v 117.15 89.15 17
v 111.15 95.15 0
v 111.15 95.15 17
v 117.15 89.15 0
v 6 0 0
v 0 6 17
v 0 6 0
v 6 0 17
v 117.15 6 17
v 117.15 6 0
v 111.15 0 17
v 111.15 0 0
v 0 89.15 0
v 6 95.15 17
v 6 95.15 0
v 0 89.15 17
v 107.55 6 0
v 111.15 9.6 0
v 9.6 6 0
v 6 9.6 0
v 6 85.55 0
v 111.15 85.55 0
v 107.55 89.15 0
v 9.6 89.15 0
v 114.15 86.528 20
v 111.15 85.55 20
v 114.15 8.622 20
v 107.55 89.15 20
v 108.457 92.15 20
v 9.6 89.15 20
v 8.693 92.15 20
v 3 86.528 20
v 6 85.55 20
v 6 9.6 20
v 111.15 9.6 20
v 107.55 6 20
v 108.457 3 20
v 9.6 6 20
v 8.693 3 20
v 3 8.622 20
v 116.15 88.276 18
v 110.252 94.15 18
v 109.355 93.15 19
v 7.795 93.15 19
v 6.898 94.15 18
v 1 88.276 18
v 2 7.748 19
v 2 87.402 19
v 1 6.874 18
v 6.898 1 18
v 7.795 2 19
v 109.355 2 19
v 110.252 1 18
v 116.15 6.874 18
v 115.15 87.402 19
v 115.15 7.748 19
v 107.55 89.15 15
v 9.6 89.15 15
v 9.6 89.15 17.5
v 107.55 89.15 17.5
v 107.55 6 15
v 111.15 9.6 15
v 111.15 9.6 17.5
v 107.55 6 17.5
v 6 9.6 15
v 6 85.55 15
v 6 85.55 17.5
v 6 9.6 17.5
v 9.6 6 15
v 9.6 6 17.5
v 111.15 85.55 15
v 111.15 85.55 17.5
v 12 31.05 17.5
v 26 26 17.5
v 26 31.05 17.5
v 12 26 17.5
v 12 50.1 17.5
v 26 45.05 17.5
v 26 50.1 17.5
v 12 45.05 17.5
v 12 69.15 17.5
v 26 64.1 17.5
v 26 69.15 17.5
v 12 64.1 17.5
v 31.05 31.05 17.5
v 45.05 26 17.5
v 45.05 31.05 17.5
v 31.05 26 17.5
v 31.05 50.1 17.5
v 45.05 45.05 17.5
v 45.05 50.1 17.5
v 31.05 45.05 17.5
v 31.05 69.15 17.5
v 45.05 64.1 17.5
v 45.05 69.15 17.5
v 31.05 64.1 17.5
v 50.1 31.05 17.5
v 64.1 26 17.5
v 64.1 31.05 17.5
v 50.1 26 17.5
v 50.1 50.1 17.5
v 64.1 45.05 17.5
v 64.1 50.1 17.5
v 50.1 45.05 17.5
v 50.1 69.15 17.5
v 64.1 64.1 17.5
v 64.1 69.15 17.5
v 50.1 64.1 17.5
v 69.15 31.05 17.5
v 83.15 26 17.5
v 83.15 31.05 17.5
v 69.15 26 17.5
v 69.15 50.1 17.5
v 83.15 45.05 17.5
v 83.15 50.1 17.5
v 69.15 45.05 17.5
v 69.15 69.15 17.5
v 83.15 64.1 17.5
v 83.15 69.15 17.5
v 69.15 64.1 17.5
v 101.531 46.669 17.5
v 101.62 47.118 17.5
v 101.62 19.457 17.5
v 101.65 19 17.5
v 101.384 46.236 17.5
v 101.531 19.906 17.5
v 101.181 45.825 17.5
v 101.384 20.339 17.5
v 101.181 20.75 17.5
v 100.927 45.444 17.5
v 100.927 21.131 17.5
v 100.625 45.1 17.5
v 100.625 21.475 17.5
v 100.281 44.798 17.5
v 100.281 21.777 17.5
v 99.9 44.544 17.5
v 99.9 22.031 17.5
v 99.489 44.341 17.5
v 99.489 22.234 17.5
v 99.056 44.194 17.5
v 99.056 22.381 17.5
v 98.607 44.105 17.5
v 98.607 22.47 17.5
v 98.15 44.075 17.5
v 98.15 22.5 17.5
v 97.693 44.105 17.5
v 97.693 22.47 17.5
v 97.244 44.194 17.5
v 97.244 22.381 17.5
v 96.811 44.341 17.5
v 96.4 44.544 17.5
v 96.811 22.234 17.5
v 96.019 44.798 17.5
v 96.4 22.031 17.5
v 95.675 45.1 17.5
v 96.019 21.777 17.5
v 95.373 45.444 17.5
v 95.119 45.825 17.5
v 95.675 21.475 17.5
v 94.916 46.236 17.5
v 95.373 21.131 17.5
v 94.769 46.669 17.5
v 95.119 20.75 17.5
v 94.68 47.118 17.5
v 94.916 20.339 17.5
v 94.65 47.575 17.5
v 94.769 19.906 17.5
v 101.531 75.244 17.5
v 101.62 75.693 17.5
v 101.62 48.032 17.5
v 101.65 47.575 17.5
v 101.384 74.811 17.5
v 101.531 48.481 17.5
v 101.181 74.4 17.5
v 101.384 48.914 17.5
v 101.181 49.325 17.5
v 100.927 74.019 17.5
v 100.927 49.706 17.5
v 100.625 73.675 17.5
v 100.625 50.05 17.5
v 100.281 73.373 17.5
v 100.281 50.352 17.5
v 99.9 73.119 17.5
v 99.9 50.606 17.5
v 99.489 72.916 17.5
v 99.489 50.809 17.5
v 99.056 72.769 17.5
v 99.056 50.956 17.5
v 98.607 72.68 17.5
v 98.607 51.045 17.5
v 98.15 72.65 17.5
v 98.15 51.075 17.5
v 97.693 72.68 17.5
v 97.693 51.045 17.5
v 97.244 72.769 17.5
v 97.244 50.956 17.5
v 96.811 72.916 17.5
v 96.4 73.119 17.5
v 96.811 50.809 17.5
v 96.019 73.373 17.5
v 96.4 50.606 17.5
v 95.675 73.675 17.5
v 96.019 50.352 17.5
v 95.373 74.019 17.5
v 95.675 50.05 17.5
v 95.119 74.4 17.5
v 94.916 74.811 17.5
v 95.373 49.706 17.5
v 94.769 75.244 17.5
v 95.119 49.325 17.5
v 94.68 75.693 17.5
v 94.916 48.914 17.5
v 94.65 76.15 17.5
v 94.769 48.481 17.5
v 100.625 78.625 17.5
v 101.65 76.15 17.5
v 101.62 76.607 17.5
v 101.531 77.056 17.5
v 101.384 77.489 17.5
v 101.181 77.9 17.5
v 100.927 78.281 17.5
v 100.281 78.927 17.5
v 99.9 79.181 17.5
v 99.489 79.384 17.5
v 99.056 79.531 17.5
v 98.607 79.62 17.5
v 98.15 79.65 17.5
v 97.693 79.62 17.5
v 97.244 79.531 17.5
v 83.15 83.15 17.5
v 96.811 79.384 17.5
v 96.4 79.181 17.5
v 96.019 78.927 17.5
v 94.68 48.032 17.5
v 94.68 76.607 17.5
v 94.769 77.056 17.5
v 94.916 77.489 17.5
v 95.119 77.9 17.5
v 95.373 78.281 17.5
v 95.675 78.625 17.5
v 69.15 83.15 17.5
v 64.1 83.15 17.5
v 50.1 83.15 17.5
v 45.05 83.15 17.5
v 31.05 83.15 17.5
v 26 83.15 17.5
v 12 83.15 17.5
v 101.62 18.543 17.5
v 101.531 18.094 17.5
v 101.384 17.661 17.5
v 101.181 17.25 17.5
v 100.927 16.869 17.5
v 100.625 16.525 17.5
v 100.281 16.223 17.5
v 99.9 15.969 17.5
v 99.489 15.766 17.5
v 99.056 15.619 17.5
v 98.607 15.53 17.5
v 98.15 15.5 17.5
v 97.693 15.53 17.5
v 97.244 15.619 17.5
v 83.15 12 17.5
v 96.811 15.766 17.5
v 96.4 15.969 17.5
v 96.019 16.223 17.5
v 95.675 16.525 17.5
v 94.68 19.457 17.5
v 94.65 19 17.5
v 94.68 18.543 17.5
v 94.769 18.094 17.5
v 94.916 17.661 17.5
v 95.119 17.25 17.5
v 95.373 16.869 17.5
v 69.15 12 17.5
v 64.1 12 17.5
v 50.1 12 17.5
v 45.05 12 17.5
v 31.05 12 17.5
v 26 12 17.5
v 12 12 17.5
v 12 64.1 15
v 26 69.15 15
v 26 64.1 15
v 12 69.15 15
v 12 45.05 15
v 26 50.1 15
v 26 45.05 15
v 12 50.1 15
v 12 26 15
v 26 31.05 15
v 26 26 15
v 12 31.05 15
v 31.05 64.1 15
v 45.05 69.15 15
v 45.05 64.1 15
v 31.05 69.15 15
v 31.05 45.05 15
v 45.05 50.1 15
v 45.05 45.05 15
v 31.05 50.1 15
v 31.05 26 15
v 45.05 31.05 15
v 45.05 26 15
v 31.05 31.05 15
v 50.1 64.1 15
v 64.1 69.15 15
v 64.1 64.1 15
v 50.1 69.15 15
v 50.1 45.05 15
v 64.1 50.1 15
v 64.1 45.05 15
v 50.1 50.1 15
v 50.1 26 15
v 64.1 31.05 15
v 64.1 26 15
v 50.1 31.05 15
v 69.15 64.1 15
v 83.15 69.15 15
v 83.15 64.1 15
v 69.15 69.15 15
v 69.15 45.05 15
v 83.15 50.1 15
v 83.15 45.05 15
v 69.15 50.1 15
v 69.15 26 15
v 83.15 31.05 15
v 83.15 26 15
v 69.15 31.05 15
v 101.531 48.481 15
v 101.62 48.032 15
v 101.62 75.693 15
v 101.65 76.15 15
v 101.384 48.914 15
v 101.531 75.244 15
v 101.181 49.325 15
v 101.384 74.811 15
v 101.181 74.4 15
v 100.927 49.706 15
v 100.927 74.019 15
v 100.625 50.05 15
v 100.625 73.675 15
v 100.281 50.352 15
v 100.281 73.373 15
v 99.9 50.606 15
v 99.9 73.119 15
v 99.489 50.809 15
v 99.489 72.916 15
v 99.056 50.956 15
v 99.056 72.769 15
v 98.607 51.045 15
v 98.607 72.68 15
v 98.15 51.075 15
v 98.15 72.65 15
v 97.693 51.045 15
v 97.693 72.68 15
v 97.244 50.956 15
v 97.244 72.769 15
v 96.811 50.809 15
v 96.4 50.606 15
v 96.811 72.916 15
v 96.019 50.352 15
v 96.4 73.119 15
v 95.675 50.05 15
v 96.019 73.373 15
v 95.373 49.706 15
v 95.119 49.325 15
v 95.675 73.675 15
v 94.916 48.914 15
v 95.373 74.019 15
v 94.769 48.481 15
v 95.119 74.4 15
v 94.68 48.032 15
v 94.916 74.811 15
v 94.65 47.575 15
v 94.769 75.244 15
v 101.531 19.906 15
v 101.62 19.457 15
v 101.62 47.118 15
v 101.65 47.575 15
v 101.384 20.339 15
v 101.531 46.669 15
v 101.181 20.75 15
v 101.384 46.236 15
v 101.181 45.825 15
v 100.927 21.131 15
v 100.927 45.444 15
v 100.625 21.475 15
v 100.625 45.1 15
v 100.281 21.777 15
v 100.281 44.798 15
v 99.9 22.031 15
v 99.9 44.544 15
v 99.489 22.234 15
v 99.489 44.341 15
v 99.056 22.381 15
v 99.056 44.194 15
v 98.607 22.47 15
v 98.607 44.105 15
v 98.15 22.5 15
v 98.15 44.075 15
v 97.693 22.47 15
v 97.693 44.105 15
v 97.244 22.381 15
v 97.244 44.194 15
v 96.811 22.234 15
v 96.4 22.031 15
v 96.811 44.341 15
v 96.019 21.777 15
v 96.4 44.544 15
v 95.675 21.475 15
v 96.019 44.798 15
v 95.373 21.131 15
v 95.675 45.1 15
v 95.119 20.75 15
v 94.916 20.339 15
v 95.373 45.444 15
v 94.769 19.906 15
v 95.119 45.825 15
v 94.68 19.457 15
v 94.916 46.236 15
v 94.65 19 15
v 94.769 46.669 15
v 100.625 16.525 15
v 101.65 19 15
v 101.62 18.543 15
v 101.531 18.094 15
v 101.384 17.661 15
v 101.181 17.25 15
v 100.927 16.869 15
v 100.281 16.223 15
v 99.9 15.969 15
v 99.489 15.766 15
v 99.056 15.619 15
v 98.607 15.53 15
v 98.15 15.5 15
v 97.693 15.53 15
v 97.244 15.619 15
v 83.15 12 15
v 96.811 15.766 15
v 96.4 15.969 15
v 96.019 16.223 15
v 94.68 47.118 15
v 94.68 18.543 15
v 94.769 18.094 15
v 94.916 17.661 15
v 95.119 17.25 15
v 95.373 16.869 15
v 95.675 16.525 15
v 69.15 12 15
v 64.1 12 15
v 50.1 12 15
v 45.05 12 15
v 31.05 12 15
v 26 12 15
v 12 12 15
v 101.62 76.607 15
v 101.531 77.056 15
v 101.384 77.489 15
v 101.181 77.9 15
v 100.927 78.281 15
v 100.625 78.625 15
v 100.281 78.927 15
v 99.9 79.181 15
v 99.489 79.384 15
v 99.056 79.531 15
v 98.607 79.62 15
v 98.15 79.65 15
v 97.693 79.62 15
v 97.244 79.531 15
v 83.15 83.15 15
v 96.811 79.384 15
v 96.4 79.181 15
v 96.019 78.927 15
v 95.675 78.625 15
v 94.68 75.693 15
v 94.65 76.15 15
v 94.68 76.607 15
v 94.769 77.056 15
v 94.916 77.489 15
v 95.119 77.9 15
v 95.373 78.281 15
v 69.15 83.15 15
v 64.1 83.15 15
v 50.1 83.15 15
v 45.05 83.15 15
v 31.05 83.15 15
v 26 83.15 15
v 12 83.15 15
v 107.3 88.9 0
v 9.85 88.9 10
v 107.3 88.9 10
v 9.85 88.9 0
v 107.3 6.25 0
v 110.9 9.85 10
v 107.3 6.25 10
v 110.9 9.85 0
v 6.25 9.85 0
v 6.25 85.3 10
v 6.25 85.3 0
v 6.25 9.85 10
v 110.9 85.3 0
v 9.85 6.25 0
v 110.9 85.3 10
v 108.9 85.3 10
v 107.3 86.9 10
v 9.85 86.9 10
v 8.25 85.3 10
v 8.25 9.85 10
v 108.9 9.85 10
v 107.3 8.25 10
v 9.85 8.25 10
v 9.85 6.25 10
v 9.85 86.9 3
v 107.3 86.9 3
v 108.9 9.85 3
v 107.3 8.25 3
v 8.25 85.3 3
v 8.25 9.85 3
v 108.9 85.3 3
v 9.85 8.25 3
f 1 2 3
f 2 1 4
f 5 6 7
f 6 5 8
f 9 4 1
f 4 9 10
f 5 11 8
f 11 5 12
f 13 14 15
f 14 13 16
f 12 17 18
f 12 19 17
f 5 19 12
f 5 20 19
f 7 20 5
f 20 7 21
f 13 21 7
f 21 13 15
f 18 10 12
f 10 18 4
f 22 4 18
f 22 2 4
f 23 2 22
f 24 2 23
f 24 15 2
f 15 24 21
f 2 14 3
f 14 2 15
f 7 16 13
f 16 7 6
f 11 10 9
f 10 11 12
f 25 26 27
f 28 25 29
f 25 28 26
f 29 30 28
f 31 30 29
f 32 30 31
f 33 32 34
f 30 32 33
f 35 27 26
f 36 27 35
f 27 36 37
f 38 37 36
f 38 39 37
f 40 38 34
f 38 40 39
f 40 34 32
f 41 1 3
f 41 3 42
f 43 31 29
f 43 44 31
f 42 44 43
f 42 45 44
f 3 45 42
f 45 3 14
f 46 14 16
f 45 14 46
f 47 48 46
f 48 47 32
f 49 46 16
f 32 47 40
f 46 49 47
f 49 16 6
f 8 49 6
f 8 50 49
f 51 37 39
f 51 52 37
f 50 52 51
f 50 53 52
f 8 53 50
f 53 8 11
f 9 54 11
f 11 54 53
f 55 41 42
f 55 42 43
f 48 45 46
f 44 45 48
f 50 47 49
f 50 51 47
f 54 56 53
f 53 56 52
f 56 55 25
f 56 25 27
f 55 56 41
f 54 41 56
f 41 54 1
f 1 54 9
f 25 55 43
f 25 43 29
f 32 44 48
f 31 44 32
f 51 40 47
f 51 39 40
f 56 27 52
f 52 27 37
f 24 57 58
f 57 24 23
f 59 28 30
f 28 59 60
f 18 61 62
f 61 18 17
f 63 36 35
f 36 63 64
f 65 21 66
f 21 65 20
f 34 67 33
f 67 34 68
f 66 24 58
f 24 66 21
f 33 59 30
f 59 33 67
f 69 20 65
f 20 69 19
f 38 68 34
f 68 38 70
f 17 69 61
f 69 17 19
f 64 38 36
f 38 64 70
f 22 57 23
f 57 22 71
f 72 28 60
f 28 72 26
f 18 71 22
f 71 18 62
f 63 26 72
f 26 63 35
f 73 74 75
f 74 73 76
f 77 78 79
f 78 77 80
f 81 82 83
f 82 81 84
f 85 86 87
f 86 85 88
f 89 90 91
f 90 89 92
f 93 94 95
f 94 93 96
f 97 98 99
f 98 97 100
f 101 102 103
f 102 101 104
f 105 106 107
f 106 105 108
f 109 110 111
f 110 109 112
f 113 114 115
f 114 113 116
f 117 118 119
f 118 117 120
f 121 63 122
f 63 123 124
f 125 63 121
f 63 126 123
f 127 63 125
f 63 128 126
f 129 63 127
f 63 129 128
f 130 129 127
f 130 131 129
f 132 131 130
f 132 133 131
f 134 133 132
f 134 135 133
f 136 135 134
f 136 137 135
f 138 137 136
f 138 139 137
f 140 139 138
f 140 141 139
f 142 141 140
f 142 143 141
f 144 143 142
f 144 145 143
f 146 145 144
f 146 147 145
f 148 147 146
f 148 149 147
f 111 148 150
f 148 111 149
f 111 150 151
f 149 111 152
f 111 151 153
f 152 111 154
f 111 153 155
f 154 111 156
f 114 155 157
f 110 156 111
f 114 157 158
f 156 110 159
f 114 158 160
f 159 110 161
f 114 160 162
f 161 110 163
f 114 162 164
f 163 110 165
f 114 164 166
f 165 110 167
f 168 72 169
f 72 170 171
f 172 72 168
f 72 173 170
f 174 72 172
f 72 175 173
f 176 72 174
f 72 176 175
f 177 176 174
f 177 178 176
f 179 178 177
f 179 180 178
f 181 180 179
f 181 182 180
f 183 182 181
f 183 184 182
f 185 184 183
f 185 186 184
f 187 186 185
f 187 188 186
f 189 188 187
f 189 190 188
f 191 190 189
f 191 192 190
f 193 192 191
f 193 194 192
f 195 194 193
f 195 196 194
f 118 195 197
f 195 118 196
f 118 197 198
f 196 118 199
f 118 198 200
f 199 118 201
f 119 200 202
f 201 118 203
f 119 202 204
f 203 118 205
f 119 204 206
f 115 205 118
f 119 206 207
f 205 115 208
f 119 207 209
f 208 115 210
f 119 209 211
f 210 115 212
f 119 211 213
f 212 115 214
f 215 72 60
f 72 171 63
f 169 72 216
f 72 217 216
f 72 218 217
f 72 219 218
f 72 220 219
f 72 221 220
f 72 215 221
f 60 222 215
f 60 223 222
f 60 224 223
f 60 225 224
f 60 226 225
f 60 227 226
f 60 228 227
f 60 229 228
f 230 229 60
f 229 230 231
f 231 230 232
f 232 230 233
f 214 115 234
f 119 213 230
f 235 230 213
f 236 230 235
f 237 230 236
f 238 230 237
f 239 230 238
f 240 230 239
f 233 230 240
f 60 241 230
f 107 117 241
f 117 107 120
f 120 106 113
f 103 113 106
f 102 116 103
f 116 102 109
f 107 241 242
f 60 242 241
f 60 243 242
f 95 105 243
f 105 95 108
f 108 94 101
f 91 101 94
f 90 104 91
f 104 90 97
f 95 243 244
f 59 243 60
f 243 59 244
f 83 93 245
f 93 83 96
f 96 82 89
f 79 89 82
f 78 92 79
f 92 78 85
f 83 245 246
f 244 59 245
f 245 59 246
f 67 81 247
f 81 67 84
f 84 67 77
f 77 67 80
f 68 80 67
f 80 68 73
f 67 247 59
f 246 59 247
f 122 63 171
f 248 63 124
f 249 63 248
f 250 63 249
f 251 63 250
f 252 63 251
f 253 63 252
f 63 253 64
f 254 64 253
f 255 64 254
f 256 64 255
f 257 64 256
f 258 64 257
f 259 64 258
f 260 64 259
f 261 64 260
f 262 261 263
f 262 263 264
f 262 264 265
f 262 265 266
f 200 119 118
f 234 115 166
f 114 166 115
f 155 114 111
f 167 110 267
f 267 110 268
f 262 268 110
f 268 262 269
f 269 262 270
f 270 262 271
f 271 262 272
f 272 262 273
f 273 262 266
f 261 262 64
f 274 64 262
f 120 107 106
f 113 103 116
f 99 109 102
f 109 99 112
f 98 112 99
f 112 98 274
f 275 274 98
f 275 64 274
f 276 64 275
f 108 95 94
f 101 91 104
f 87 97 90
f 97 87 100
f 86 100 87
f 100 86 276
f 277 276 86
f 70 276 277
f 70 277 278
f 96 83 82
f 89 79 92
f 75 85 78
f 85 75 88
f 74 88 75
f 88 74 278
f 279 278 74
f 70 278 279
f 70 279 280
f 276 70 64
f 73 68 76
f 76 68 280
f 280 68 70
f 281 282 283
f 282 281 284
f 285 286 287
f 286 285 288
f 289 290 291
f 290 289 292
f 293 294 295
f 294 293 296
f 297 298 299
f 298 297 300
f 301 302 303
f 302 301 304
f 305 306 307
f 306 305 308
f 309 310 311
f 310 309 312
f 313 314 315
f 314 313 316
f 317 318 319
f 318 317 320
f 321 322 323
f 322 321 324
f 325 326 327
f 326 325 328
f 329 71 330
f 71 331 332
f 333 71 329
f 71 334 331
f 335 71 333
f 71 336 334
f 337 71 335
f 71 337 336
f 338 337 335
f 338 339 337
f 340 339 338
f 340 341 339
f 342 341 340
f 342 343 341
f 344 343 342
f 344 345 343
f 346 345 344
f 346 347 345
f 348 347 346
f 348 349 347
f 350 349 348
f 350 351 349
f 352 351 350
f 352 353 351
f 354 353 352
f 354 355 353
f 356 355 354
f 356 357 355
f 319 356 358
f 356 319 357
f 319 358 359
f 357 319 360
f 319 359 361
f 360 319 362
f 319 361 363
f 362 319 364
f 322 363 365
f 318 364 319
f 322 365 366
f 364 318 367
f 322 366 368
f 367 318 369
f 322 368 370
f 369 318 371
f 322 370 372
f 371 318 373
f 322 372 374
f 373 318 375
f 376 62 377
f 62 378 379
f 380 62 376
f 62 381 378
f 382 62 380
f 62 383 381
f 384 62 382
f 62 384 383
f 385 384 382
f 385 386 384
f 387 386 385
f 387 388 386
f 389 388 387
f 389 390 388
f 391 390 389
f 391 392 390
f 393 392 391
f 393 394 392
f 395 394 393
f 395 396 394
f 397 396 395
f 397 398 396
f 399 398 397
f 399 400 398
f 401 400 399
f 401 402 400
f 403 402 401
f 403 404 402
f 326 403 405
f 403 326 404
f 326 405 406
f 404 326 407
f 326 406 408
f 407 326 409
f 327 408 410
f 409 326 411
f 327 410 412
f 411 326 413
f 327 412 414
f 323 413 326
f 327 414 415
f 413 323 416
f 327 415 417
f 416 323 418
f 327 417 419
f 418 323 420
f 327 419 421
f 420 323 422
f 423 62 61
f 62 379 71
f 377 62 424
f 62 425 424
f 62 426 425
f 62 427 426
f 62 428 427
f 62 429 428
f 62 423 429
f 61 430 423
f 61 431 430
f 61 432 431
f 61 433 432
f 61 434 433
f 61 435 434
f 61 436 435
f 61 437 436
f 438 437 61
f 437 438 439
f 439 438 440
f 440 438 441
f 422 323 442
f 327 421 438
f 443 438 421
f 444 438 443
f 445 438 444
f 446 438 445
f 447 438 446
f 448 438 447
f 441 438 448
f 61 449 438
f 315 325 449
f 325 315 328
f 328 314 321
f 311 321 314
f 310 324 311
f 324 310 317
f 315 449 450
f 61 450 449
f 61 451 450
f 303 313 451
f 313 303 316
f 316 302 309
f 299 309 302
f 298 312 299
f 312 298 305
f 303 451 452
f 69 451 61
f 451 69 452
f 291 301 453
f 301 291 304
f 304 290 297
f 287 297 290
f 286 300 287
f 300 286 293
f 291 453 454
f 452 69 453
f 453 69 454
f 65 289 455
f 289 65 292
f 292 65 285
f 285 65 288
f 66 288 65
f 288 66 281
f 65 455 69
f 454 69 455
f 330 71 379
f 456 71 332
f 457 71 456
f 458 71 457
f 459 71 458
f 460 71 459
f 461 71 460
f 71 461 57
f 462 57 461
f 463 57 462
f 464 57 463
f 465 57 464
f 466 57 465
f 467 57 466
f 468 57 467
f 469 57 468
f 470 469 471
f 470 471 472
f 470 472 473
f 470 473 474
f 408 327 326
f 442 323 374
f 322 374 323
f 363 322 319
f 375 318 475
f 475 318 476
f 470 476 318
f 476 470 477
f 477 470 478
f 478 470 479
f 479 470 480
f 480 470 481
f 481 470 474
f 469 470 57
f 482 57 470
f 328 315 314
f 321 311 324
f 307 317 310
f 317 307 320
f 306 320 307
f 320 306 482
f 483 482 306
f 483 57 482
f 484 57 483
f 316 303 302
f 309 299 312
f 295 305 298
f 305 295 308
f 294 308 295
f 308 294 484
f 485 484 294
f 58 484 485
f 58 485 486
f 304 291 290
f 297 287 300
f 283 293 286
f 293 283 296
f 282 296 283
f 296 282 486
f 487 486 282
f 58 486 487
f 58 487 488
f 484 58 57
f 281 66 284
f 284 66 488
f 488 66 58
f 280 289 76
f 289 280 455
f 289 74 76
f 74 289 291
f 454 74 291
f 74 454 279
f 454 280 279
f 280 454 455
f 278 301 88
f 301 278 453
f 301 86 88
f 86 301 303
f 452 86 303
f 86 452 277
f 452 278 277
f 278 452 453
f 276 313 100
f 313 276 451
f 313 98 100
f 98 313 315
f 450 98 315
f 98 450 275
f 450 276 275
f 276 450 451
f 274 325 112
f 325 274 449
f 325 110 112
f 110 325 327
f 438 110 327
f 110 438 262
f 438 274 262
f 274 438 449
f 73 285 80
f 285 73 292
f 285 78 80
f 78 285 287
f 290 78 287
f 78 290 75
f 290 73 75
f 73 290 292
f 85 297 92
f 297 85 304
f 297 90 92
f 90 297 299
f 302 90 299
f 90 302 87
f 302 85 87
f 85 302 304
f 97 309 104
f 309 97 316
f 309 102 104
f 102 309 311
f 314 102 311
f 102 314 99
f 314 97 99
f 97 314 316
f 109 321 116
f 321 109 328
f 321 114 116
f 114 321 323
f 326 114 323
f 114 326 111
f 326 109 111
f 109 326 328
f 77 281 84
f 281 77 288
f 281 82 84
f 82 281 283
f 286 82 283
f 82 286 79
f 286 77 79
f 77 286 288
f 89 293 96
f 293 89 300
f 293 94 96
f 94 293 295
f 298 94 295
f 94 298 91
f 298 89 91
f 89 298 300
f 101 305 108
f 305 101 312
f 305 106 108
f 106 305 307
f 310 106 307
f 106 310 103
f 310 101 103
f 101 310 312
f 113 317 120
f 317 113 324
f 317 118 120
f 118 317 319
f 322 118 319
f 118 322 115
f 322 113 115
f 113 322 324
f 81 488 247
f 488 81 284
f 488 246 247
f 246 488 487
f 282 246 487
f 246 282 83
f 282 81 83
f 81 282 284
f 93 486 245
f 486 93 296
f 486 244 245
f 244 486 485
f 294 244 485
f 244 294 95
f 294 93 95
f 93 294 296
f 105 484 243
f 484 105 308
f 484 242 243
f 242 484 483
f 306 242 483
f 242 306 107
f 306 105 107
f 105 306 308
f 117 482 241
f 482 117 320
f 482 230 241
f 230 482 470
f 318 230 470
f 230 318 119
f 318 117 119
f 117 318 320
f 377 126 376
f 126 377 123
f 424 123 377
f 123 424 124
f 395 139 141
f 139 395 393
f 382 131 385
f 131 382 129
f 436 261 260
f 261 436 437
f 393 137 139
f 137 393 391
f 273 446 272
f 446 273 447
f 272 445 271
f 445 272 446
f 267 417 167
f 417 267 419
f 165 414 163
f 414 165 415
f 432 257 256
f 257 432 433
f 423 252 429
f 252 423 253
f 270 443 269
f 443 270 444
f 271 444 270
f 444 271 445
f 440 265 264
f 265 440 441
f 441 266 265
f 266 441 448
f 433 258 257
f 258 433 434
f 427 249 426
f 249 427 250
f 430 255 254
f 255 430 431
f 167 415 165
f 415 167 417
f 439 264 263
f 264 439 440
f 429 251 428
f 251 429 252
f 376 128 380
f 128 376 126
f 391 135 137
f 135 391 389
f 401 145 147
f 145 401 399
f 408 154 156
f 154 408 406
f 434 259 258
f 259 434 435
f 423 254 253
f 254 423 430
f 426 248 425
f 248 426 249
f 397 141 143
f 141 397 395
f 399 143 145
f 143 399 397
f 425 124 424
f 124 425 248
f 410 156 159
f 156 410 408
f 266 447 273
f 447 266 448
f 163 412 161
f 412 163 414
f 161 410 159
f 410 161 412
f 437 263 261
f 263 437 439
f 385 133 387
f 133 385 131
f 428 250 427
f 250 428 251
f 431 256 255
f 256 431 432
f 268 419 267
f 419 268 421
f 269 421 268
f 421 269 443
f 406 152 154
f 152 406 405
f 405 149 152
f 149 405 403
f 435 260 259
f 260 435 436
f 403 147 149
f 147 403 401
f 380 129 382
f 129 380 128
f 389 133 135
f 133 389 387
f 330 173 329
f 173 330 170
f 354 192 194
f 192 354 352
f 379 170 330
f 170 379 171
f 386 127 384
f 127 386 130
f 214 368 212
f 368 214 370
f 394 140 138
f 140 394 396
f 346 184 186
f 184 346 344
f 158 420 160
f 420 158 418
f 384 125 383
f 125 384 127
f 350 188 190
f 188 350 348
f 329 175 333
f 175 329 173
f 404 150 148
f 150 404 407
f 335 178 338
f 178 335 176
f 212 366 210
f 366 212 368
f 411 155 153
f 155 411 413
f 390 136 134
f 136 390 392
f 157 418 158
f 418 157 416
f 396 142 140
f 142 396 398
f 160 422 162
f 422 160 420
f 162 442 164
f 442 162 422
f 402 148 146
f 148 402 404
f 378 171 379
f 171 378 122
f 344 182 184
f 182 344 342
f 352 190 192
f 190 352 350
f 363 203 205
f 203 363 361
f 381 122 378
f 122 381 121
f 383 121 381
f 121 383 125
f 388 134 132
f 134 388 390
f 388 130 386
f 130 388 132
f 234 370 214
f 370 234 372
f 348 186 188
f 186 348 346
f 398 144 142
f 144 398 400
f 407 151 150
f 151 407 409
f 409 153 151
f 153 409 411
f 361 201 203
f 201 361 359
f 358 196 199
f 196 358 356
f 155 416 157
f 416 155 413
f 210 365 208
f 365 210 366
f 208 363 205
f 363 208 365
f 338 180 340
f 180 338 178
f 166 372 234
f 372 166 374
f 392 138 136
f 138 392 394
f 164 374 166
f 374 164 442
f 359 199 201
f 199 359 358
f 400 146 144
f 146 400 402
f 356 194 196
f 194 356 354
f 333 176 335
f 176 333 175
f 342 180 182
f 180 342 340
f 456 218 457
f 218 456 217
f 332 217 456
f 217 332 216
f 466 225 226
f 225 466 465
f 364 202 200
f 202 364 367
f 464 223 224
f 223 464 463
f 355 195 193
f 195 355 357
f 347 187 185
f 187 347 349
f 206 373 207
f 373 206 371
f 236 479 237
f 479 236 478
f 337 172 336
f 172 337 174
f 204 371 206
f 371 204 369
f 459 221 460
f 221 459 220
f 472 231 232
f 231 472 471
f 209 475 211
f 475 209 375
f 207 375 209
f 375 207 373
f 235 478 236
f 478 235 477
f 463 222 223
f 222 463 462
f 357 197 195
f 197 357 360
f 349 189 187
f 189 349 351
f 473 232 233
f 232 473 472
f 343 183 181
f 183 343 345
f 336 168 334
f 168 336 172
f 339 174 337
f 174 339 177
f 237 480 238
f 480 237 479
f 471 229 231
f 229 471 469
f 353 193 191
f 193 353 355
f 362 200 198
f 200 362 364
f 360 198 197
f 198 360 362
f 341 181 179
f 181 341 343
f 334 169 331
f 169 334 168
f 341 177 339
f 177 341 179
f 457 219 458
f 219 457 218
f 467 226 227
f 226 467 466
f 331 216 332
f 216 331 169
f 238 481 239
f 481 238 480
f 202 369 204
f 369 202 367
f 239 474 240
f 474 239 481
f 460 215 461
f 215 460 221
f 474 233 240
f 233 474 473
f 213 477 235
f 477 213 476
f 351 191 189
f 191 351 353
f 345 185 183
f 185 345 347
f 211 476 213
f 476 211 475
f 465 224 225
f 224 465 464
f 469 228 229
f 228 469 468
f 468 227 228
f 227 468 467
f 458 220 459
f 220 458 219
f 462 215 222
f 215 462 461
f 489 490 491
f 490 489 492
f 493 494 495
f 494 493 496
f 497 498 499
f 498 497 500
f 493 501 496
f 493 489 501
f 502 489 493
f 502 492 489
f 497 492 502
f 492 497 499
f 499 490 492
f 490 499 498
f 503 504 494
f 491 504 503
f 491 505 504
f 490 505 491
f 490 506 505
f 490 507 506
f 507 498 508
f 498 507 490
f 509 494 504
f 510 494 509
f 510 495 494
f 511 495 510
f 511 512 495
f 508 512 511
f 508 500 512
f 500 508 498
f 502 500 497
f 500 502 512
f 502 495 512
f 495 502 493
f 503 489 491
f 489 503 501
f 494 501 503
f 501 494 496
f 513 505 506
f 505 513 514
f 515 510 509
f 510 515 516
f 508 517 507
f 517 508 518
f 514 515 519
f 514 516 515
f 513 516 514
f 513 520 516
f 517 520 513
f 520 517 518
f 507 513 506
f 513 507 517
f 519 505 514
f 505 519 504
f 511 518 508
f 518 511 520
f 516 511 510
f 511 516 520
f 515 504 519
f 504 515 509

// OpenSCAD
// file: case_v4_bottom.scad
// Stream Deck Macro — bottom plate v4 (tray with sliding wall)
// Slides up into the top piece's inner cavity from below. The tray's outer
// wall matches the top's inner hollow, minus a small per-side clearance so
// it can actually slide in once printed.

include <case_params.scad>

fit_clearance    = 0.25; // per-side gap for a sliding fit
floor_thickness  = 3;    // tray floor thickness
wall_thickness   = 2;    // tray's own perimeter wall thickness
wall_height      = 10;   // how tall the tray wall is (slides into the top's cavity)

bottom_w = (plate_w - 2*border) - 2*fit_clearance;
bottom_d = (plate_d - 2*border) - 2*fit_clearance;
bottom_chamfer = corner_chamfer * 0.6;

module case_bottom() {
    translate([border + fit_clearance, border + fit_clearance, 0])
        difference() {
            linear_extrude(height = wall_height)
                chamfered_rect(bottom_w, bottom_d, bottom_chamfer);
            translate([wall_thickness, wall_thickness, floor_thickness])
                linear_extrude(height = wall_height)
                    chamfered_rect(bottom_w - 2*wall_thickness,
                                   bottom_d - 2*wall_thickness,
                                   max(bottom_chamfer - wall_thickness, 0.1));
        }
}

case_bottom();
// file: case_v4_top.scad
// Stream Deck Macro — top plate v4
// Outer shell style inspired by "MisteRdeck / Ocreeb DIY Macro Keypad"
// (printables.com) — fresh parametric geometry: chamfered-corner rim with a
// tapered top edge, and a recessed inner deck (like the original) for the
// switches, hollow underneath for switch body clearance.

include <case_params.scad>

module rim_shell() {
    // straight body
    linear_extrude(height = rim_height - bevel_height)
        chamfered_rect(plate_w, plate_d, corner_chamfer);
    // tapered top collar — centered before scaling so all 4 sides bevel evenly
    translate([plate_w/2, plate_d/2, rim_height - bevel_height])
        linear_extrude(height = bevel_height,
                       scale = [(plate_w - 2*bevel_inset) / plate_w,
                                (plate_d - 2*bevel_inset) / plate_d])
            translate([-plate_w/2, -plate_d/2])
                chamfered_rect(plate_w, plate_d, corner_chamfer);
}

module inner_hollow() {
    // full-depth opening inside the rim border, plus extra above/below to
    // guarantee clean cuts
    translate([border, border, -1])
        linear_extrude(height = rim_height + 2)
            chamfered_rect(plate_w - 2*border, plate_d - 2*border, corner_chamfer * 0.6);
}

module switch_deck() {
    // Slightly larger than the hollow it sits in, overlapping the wall by
    // `overlap` on every side — a flush, knife-edge touch is numerically
    // fragile for CSG union (esp. once one side gets a multmatrix applied
    // to it) and can leave the deck as a disconnected floating volume.
    overlap = 0.5;
    translate([border - overlap, border - overlap, rim_height - deck_recess - deck_thickness])
        linear_extrude(height = deck_thickness)
            chamfered_rect(plate_w - 2*border + 2*overlap, plate_d - 2*border + 2*overlap, corner_chamfer * 0.6);
}

module new_switch_grid(origin_x, origin_y) {
    for (row = [0 : grid_rows - 1])
        for (col = [0 : grid_cols - 1])
            translate([origin_x + col*switch_pitch, origin_y + row*switch_pitch, -2])
                linear_extrude(height = rim_height + 4)
                    square(switch_hole, center = true);
}

module new_encoder_column(origin_x, origin_y, grid_height) {
    spacing = grid_height / (encoder_count - 1);
    for (i = [0 : encoder_count - 1])
        translate([origin_x, origin_y + i*spacing, -2])
            linear_extrude(height = rim_height + 4)
                circle(d = encoder_d, $fn = 48);
}

grid_origin_x = margin + switch_hole/2;
grid_origin_y = margin + switch_hole/2;
grid_height_span = (grid_rows - 1) * switch_pitch;
encoder_x = grid_origin_x + (grid_cols - 1)*switch_pitch + switch_hole/2 + encoder_gap;

module case_top() {
    difference() {
        union() {
            difference() {
                rim_shell();
                inner_hollow();
            }
            switch_deck();
        }
        new_switch_grid(grid_origin_x, grid_origin_y);
        new_encoder_column(encoder_x, grid_origin_y, grid_height_span);
    }
}

// ---- Wedge tilt: flat bottom everywhere, walls + deck grow taller toward
// the back.
tilt_angle_deg = 30;
riser_height = plate_d * tan(tilt_angle_deg);   // ~54.93mm extra height at the back
shear_factor = riser_height / plate_d;
back_height = rim_height + riser_height;
deck_mid_z = rim_height - deck_recess - deck_thickness/2;   // flat-design deck centerline

module wedge_cutter(front_h) {
    // Half-space block whose top face is the plane z = y*shear_factor + front_h
    // — passes through (y=0, z=front_h).
    translate([0, 0, front_h])
        rotate([tilt_angle_deg, 0, 0])
            translate([-1000, -1000, -2000])
                cube([plate_w + 2000, plate_d + 2000, 2000]);
}

module wedge_straight_body() {
    // Front height stays at rim_height - bevel_height (same as the flat
    // design's straight body, below where its tapered collar used to start)
    // so it can never dip low enough to cut into the deck. +0.3 overlap into
    // the collar above, so the two pieces have real shared volume, not just
    // a knife-edge touch.
    intersection() {
        linear_extrude(height = back_height)
            chamfered_rect(plate_w, plate_d, corner_chamfer);
        wedge_cutter(rim_height - bevel_height + 0.3);
    }
}

module wedge_top_collar() {
    // Same tapered-collar shape as the flat design's rim_shell() bevel,
    // sheared by the same slope as everything else so it sits flush on top
    // of wedge_straight_body() at every y — thin (bevel_height=3mm), so the
    // shear reads as a clean taper here, not a stretched parallelogram like
    // it did on the full 20mm+ wall.
    // Uses offset() (a constant inward shrink per edge) instead of the flat
    // design's non-uniform X/Y scale — scaling by different factors in X and
    // Y (since plate_w != plate_d) skews the 45 degree corner chamfer at the
    // top out of alignment with the same chamfer below it, which reads as a
    // disconnected/kinked edge right where the collar meets the body.
    sheared()
    hull() {
        translate([0, 0, rim_height - bevel_height])
            linear_extrude(height = 0.01)
                chamfered_rect(plate_w, plate_d, corner_chamfer);
        translate([0, 0, rim_height])
            linear_extrude(height = 0.01)
                offset(delta = -bevel_inset)
                    chamfered_rect(plate_w, plate_d, corner_chamfer);
    }
}

module wedge_outer_shell() {
    difference() {
        union() {
            wedge_straight_body();
            wedge_top_collar();
        }
        translate([border, border, -1])
            linear_extrude(height = back_height + 2)
                chamfered_rect(plate_w - 2*border, plate_d - 2*border, corner_chamfer * 0.6);
    }
}

module sheared() {
    multmatrix([
        [1, 0, 0, 0],
        [0, 1, 0, 0],
        [0, shear_factor, 1, 0],
        [0, 0, 0, 1]
    ])
    children();
}

module tilted_hole(px, py) {
    // Places children (a vertical, centered hole prism) at (px, py) on the
    // deck's tilted surface, then rotates it in place so its axis is
    // perpendicular to the deck face — matching how a plate-mount switch or
    // encoder actually clips in, instead of punching straight down through a
    // slanted plate at an angle.
    translate([px, py, deck_mid_z + shear_factor * py])
        rotate([tilt_angle_deg, 0, 0])
            children();
}

module tilted_switch_grid(origin_x, origin_y) {
    for (row = [0 : grid_rows - 1])
        for (col = [0 : grid_cols - 1])
            tilted_hole(origin_x + col*switch_pitch, origin_y + row*switch_pitch)
                linear_extrude(height = 20, center = true)
                    square(switch_hole, center = true);
}

module tilted_encoder_column(origin_x, origin_y, grid_height) {
    spacing = grid_height / (encoder_count - 1);
    for (i = [0 : encoder_count - 1])
        tilted_hole(origin_x, origin_y + i*spacing)
            linear_extrude(height = 20, center = true)
                circle(d = encoder_d, $fn = 48);
}

module case_top_tilted() {
    difference() {
        union() {
            wedge_outer_shell();
            sheared() switch_deck();
        }
        tilted_switch_grid(grid_origin_x, grid_origin_y);
        tilted_encoder_column(encoder_x, grid_origin_y, grid_height_span);
    }
}

case_top_tilted();
// file: case_params.scad
// Stream Deck Macro — shared case dimensions (included by top/bottom/assembly)

// ---- Our target layout ----
switch_hole   = 14;
switch_pitch  = 19.05;
grid_cols     = 4;
grid_rows     = 4;
grid_span     = (grid_cols - 1) * switch_pitch + switch_hole; // 71.15

encoder_d     = 7;       // placeholder — confirm with calipers before printing final
encoder_count = 3;
encoder_gap   = 15;

margin = 12;

// ---- Shell style ----
corner_chamfer = 6;    // diagonal cut on each of the 4 corners
rim_height     = 20;   // total wall height (top to bottom), 2cm per feedback
bevel_height   = 3;    // top tapered collar height
bevel_inset    = 3;    // how far the top face is inset from the outer wall
border         = 6;    // rim wall thickness (outer edge to inner hollow)
deck_recess    = 2.5;  // how far below the rim top the switch deck sits
deck_thickness = 2.5;  // thickness of the switch deck floor

plate_w = margin*2 + grid_span + encoder_gap + encoder_d;
plate_d = margin*2 + grid_span;

module chamfered_rect(w, d, c) {
    polygon(points = [
        [c, 0], [w - c, 0],
        [w, c], [w, d - c],
        [w - c, d], [c, d],
        [0, d - c], [0, c]
    ]);
}
// main file
include <case_params.scad>
use <case_v4_top.scad>
use <case_v4_bottom.scad>

echo("plate_w=", plate_w, "plate_d=", plate_d, "border=", border);

case_top();
case_bottom();
